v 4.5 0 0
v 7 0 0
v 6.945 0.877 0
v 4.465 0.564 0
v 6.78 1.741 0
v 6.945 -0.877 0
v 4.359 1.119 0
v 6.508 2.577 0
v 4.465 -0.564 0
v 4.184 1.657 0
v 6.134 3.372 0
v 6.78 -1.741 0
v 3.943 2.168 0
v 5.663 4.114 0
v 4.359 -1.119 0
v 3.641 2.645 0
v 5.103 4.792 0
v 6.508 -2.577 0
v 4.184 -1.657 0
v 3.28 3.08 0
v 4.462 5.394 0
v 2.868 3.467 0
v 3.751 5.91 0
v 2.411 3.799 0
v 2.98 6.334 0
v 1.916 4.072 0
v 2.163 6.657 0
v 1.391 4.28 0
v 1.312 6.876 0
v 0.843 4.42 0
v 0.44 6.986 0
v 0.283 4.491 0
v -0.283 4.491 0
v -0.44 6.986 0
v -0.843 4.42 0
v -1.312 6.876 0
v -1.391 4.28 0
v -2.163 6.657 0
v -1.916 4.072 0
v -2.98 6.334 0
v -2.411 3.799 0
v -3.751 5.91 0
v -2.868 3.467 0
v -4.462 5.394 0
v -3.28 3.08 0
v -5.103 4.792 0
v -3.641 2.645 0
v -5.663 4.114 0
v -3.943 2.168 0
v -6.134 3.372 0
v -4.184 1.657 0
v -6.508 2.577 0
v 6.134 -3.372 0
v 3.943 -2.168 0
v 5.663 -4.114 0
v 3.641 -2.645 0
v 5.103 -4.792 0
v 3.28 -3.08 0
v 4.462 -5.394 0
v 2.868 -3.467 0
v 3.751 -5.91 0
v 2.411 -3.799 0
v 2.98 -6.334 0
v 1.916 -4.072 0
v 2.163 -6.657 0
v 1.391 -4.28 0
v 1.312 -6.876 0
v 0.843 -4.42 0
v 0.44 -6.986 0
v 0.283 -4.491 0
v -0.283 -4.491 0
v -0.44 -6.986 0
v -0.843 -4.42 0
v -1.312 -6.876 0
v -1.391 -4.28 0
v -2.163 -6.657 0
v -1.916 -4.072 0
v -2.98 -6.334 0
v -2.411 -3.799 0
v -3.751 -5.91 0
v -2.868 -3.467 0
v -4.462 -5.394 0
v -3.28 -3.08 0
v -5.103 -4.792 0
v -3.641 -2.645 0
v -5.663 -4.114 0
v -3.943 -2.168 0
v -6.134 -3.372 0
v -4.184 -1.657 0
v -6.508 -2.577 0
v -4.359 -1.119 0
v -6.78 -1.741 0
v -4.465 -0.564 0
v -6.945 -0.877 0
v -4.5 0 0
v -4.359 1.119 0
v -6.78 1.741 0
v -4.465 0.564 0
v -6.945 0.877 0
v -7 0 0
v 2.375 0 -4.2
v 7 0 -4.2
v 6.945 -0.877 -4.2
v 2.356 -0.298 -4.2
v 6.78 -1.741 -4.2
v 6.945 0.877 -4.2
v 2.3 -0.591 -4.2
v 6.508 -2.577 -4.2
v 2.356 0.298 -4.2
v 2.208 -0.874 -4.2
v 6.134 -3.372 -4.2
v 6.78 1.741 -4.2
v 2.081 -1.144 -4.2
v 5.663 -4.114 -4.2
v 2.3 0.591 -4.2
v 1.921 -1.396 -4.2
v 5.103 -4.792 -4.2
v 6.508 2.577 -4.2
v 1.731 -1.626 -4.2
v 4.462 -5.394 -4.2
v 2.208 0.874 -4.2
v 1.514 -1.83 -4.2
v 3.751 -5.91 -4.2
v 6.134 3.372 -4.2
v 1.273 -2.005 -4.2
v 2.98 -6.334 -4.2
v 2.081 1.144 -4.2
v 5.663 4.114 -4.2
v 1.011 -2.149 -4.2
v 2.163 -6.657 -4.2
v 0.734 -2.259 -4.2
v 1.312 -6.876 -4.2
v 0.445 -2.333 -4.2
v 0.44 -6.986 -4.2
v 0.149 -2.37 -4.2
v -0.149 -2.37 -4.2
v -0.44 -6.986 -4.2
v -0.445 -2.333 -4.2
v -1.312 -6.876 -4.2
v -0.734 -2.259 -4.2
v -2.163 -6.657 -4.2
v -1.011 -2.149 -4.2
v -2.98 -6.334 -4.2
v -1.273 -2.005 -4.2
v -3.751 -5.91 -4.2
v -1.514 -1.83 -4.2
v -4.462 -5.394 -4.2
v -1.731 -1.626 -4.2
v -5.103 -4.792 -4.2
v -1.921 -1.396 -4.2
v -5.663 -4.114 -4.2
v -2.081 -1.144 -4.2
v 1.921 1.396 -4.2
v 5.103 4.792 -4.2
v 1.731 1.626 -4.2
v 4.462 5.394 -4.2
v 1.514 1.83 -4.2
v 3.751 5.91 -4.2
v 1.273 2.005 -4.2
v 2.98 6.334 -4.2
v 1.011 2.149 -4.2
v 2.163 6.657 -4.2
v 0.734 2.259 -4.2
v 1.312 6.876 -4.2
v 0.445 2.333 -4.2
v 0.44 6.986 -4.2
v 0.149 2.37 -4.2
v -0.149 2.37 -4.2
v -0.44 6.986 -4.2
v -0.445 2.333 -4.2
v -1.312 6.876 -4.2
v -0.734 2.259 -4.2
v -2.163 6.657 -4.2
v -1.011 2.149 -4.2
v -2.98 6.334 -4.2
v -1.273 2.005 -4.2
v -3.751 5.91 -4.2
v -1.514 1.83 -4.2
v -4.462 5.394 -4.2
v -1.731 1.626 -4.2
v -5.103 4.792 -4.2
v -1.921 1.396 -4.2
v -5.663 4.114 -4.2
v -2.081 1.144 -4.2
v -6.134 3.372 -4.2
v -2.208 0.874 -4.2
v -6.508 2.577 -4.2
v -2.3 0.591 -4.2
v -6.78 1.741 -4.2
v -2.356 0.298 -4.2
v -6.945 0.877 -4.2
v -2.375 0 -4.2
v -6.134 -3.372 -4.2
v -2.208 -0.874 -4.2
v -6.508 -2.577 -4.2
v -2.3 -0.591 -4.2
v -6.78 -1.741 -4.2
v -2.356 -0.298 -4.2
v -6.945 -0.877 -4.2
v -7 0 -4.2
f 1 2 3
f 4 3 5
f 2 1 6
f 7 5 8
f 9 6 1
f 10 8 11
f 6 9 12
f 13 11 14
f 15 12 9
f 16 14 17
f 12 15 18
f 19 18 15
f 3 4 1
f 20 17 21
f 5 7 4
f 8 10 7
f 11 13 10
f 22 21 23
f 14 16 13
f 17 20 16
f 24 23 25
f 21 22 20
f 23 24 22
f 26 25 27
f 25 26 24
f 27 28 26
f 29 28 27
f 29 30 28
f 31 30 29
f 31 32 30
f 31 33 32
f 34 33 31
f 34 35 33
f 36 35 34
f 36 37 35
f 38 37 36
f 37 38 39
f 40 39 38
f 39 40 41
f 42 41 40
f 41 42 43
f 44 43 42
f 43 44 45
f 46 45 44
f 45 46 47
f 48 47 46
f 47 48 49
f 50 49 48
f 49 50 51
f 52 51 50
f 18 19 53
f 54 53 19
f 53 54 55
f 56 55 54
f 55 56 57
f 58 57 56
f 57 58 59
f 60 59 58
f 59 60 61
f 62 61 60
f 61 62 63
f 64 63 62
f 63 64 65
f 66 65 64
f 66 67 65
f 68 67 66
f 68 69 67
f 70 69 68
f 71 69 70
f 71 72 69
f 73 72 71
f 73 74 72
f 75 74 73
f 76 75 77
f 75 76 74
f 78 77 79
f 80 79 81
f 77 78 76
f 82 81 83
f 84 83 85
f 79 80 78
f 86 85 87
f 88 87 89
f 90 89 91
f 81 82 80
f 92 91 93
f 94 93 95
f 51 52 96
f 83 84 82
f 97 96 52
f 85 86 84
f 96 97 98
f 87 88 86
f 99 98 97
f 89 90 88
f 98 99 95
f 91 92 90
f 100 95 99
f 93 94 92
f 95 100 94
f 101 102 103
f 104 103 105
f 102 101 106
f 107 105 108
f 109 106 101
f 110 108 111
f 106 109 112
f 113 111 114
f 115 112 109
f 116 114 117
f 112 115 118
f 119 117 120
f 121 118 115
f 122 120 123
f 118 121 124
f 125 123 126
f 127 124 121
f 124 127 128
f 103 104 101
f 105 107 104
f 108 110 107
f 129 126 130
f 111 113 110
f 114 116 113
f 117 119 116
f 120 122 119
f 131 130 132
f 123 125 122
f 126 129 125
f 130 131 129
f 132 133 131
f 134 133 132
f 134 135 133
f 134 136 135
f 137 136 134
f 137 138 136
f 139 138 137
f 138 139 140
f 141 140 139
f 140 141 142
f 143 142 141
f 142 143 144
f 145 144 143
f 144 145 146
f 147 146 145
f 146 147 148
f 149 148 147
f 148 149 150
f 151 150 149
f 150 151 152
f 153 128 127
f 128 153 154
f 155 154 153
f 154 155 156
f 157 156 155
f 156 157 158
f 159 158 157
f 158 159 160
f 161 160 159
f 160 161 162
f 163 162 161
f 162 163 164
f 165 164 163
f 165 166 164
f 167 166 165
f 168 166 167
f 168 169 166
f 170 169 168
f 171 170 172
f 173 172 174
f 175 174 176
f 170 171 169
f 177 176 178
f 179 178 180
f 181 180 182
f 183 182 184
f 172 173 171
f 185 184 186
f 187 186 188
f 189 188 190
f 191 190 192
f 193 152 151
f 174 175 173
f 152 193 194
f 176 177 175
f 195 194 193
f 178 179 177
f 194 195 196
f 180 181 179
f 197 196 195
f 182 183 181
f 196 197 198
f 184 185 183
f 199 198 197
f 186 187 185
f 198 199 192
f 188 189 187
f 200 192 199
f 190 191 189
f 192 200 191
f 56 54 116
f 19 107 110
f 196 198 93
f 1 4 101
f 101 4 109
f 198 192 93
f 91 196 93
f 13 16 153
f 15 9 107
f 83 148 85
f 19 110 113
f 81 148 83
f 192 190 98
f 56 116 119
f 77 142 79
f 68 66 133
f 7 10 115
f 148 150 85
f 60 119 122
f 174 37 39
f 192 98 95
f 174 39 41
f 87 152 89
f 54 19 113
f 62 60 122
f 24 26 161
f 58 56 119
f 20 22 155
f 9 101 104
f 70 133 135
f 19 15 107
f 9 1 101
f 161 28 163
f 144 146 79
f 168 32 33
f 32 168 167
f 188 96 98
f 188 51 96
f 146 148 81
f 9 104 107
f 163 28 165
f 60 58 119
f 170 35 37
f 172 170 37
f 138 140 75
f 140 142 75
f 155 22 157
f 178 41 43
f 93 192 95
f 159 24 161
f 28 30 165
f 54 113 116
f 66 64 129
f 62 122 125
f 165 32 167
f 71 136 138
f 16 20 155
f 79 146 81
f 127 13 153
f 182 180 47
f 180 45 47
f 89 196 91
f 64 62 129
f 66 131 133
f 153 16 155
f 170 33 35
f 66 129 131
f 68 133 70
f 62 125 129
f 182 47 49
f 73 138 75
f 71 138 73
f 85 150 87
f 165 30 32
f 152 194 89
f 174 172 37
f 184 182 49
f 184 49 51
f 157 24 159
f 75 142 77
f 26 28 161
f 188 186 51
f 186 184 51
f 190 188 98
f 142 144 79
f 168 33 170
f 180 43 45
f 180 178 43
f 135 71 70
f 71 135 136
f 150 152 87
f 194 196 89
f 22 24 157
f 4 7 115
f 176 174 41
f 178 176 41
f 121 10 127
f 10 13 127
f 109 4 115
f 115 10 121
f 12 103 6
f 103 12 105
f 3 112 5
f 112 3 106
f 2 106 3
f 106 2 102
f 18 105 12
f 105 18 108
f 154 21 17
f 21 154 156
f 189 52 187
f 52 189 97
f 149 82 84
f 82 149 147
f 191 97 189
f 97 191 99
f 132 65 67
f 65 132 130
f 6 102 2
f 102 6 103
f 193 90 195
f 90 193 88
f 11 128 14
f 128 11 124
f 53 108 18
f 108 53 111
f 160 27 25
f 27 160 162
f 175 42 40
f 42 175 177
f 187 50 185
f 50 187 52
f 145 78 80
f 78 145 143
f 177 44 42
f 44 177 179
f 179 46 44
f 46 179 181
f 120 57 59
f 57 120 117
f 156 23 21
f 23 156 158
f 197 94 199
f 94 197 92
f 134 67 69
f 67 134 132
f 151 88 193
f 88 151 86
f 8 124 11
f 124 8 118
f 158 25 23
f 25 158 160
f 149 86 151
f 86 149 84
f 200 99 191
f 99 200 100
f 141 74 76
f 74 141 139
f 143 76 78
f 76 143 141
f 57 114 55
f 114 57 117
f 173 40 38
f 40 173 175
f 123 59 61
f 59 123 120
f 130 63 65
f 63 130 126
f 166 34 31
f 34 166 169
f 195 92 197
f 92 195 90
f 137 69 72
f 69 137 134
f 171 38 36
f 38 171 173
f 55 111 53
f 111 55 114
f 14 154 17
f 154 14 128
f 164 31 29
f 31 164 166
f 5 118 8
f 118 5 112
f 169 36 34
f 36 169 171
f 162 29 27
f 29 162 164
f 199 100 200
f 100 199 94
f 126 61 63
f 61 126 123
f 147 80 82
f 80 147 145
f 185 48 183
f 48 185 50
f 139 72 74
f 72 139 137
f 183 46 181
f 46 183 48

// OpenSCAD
$fn = 50;


difference() {
	union() {
		translate(v = [0, 0, -4.2000000000]) {
			cylinder(h = 4.2000000000, r = 7.0000000000);
		}
	}
	union() {
		translate(v = [0, 0, 0]) {
			rotate(a = [0, 0, 0]) {
				difference() {
					union() {
						translate(v = [0, 0, -4.2000000000]) {
							cylinder(h = 4.2000000000, r = 2.2500000000);
						}
						translate(v = [0, 0, -4.2000000000]) {
							cylinder(h = 4.2000000000, r1 = 2.3750000000, r2 = 4.5000000000);
						}
						translate(v = [0, 0, -4.2000000000]) {
							cylinder(h = 4.2000000000, r = 2.3750000000);
						}
						translate(v = [0, 0, -4.2000000000]) {
							cylinder(h = 4.2000000000, r = 2.2500000000);
						}
					}
					union();
				}
			}
		}
	}
}
